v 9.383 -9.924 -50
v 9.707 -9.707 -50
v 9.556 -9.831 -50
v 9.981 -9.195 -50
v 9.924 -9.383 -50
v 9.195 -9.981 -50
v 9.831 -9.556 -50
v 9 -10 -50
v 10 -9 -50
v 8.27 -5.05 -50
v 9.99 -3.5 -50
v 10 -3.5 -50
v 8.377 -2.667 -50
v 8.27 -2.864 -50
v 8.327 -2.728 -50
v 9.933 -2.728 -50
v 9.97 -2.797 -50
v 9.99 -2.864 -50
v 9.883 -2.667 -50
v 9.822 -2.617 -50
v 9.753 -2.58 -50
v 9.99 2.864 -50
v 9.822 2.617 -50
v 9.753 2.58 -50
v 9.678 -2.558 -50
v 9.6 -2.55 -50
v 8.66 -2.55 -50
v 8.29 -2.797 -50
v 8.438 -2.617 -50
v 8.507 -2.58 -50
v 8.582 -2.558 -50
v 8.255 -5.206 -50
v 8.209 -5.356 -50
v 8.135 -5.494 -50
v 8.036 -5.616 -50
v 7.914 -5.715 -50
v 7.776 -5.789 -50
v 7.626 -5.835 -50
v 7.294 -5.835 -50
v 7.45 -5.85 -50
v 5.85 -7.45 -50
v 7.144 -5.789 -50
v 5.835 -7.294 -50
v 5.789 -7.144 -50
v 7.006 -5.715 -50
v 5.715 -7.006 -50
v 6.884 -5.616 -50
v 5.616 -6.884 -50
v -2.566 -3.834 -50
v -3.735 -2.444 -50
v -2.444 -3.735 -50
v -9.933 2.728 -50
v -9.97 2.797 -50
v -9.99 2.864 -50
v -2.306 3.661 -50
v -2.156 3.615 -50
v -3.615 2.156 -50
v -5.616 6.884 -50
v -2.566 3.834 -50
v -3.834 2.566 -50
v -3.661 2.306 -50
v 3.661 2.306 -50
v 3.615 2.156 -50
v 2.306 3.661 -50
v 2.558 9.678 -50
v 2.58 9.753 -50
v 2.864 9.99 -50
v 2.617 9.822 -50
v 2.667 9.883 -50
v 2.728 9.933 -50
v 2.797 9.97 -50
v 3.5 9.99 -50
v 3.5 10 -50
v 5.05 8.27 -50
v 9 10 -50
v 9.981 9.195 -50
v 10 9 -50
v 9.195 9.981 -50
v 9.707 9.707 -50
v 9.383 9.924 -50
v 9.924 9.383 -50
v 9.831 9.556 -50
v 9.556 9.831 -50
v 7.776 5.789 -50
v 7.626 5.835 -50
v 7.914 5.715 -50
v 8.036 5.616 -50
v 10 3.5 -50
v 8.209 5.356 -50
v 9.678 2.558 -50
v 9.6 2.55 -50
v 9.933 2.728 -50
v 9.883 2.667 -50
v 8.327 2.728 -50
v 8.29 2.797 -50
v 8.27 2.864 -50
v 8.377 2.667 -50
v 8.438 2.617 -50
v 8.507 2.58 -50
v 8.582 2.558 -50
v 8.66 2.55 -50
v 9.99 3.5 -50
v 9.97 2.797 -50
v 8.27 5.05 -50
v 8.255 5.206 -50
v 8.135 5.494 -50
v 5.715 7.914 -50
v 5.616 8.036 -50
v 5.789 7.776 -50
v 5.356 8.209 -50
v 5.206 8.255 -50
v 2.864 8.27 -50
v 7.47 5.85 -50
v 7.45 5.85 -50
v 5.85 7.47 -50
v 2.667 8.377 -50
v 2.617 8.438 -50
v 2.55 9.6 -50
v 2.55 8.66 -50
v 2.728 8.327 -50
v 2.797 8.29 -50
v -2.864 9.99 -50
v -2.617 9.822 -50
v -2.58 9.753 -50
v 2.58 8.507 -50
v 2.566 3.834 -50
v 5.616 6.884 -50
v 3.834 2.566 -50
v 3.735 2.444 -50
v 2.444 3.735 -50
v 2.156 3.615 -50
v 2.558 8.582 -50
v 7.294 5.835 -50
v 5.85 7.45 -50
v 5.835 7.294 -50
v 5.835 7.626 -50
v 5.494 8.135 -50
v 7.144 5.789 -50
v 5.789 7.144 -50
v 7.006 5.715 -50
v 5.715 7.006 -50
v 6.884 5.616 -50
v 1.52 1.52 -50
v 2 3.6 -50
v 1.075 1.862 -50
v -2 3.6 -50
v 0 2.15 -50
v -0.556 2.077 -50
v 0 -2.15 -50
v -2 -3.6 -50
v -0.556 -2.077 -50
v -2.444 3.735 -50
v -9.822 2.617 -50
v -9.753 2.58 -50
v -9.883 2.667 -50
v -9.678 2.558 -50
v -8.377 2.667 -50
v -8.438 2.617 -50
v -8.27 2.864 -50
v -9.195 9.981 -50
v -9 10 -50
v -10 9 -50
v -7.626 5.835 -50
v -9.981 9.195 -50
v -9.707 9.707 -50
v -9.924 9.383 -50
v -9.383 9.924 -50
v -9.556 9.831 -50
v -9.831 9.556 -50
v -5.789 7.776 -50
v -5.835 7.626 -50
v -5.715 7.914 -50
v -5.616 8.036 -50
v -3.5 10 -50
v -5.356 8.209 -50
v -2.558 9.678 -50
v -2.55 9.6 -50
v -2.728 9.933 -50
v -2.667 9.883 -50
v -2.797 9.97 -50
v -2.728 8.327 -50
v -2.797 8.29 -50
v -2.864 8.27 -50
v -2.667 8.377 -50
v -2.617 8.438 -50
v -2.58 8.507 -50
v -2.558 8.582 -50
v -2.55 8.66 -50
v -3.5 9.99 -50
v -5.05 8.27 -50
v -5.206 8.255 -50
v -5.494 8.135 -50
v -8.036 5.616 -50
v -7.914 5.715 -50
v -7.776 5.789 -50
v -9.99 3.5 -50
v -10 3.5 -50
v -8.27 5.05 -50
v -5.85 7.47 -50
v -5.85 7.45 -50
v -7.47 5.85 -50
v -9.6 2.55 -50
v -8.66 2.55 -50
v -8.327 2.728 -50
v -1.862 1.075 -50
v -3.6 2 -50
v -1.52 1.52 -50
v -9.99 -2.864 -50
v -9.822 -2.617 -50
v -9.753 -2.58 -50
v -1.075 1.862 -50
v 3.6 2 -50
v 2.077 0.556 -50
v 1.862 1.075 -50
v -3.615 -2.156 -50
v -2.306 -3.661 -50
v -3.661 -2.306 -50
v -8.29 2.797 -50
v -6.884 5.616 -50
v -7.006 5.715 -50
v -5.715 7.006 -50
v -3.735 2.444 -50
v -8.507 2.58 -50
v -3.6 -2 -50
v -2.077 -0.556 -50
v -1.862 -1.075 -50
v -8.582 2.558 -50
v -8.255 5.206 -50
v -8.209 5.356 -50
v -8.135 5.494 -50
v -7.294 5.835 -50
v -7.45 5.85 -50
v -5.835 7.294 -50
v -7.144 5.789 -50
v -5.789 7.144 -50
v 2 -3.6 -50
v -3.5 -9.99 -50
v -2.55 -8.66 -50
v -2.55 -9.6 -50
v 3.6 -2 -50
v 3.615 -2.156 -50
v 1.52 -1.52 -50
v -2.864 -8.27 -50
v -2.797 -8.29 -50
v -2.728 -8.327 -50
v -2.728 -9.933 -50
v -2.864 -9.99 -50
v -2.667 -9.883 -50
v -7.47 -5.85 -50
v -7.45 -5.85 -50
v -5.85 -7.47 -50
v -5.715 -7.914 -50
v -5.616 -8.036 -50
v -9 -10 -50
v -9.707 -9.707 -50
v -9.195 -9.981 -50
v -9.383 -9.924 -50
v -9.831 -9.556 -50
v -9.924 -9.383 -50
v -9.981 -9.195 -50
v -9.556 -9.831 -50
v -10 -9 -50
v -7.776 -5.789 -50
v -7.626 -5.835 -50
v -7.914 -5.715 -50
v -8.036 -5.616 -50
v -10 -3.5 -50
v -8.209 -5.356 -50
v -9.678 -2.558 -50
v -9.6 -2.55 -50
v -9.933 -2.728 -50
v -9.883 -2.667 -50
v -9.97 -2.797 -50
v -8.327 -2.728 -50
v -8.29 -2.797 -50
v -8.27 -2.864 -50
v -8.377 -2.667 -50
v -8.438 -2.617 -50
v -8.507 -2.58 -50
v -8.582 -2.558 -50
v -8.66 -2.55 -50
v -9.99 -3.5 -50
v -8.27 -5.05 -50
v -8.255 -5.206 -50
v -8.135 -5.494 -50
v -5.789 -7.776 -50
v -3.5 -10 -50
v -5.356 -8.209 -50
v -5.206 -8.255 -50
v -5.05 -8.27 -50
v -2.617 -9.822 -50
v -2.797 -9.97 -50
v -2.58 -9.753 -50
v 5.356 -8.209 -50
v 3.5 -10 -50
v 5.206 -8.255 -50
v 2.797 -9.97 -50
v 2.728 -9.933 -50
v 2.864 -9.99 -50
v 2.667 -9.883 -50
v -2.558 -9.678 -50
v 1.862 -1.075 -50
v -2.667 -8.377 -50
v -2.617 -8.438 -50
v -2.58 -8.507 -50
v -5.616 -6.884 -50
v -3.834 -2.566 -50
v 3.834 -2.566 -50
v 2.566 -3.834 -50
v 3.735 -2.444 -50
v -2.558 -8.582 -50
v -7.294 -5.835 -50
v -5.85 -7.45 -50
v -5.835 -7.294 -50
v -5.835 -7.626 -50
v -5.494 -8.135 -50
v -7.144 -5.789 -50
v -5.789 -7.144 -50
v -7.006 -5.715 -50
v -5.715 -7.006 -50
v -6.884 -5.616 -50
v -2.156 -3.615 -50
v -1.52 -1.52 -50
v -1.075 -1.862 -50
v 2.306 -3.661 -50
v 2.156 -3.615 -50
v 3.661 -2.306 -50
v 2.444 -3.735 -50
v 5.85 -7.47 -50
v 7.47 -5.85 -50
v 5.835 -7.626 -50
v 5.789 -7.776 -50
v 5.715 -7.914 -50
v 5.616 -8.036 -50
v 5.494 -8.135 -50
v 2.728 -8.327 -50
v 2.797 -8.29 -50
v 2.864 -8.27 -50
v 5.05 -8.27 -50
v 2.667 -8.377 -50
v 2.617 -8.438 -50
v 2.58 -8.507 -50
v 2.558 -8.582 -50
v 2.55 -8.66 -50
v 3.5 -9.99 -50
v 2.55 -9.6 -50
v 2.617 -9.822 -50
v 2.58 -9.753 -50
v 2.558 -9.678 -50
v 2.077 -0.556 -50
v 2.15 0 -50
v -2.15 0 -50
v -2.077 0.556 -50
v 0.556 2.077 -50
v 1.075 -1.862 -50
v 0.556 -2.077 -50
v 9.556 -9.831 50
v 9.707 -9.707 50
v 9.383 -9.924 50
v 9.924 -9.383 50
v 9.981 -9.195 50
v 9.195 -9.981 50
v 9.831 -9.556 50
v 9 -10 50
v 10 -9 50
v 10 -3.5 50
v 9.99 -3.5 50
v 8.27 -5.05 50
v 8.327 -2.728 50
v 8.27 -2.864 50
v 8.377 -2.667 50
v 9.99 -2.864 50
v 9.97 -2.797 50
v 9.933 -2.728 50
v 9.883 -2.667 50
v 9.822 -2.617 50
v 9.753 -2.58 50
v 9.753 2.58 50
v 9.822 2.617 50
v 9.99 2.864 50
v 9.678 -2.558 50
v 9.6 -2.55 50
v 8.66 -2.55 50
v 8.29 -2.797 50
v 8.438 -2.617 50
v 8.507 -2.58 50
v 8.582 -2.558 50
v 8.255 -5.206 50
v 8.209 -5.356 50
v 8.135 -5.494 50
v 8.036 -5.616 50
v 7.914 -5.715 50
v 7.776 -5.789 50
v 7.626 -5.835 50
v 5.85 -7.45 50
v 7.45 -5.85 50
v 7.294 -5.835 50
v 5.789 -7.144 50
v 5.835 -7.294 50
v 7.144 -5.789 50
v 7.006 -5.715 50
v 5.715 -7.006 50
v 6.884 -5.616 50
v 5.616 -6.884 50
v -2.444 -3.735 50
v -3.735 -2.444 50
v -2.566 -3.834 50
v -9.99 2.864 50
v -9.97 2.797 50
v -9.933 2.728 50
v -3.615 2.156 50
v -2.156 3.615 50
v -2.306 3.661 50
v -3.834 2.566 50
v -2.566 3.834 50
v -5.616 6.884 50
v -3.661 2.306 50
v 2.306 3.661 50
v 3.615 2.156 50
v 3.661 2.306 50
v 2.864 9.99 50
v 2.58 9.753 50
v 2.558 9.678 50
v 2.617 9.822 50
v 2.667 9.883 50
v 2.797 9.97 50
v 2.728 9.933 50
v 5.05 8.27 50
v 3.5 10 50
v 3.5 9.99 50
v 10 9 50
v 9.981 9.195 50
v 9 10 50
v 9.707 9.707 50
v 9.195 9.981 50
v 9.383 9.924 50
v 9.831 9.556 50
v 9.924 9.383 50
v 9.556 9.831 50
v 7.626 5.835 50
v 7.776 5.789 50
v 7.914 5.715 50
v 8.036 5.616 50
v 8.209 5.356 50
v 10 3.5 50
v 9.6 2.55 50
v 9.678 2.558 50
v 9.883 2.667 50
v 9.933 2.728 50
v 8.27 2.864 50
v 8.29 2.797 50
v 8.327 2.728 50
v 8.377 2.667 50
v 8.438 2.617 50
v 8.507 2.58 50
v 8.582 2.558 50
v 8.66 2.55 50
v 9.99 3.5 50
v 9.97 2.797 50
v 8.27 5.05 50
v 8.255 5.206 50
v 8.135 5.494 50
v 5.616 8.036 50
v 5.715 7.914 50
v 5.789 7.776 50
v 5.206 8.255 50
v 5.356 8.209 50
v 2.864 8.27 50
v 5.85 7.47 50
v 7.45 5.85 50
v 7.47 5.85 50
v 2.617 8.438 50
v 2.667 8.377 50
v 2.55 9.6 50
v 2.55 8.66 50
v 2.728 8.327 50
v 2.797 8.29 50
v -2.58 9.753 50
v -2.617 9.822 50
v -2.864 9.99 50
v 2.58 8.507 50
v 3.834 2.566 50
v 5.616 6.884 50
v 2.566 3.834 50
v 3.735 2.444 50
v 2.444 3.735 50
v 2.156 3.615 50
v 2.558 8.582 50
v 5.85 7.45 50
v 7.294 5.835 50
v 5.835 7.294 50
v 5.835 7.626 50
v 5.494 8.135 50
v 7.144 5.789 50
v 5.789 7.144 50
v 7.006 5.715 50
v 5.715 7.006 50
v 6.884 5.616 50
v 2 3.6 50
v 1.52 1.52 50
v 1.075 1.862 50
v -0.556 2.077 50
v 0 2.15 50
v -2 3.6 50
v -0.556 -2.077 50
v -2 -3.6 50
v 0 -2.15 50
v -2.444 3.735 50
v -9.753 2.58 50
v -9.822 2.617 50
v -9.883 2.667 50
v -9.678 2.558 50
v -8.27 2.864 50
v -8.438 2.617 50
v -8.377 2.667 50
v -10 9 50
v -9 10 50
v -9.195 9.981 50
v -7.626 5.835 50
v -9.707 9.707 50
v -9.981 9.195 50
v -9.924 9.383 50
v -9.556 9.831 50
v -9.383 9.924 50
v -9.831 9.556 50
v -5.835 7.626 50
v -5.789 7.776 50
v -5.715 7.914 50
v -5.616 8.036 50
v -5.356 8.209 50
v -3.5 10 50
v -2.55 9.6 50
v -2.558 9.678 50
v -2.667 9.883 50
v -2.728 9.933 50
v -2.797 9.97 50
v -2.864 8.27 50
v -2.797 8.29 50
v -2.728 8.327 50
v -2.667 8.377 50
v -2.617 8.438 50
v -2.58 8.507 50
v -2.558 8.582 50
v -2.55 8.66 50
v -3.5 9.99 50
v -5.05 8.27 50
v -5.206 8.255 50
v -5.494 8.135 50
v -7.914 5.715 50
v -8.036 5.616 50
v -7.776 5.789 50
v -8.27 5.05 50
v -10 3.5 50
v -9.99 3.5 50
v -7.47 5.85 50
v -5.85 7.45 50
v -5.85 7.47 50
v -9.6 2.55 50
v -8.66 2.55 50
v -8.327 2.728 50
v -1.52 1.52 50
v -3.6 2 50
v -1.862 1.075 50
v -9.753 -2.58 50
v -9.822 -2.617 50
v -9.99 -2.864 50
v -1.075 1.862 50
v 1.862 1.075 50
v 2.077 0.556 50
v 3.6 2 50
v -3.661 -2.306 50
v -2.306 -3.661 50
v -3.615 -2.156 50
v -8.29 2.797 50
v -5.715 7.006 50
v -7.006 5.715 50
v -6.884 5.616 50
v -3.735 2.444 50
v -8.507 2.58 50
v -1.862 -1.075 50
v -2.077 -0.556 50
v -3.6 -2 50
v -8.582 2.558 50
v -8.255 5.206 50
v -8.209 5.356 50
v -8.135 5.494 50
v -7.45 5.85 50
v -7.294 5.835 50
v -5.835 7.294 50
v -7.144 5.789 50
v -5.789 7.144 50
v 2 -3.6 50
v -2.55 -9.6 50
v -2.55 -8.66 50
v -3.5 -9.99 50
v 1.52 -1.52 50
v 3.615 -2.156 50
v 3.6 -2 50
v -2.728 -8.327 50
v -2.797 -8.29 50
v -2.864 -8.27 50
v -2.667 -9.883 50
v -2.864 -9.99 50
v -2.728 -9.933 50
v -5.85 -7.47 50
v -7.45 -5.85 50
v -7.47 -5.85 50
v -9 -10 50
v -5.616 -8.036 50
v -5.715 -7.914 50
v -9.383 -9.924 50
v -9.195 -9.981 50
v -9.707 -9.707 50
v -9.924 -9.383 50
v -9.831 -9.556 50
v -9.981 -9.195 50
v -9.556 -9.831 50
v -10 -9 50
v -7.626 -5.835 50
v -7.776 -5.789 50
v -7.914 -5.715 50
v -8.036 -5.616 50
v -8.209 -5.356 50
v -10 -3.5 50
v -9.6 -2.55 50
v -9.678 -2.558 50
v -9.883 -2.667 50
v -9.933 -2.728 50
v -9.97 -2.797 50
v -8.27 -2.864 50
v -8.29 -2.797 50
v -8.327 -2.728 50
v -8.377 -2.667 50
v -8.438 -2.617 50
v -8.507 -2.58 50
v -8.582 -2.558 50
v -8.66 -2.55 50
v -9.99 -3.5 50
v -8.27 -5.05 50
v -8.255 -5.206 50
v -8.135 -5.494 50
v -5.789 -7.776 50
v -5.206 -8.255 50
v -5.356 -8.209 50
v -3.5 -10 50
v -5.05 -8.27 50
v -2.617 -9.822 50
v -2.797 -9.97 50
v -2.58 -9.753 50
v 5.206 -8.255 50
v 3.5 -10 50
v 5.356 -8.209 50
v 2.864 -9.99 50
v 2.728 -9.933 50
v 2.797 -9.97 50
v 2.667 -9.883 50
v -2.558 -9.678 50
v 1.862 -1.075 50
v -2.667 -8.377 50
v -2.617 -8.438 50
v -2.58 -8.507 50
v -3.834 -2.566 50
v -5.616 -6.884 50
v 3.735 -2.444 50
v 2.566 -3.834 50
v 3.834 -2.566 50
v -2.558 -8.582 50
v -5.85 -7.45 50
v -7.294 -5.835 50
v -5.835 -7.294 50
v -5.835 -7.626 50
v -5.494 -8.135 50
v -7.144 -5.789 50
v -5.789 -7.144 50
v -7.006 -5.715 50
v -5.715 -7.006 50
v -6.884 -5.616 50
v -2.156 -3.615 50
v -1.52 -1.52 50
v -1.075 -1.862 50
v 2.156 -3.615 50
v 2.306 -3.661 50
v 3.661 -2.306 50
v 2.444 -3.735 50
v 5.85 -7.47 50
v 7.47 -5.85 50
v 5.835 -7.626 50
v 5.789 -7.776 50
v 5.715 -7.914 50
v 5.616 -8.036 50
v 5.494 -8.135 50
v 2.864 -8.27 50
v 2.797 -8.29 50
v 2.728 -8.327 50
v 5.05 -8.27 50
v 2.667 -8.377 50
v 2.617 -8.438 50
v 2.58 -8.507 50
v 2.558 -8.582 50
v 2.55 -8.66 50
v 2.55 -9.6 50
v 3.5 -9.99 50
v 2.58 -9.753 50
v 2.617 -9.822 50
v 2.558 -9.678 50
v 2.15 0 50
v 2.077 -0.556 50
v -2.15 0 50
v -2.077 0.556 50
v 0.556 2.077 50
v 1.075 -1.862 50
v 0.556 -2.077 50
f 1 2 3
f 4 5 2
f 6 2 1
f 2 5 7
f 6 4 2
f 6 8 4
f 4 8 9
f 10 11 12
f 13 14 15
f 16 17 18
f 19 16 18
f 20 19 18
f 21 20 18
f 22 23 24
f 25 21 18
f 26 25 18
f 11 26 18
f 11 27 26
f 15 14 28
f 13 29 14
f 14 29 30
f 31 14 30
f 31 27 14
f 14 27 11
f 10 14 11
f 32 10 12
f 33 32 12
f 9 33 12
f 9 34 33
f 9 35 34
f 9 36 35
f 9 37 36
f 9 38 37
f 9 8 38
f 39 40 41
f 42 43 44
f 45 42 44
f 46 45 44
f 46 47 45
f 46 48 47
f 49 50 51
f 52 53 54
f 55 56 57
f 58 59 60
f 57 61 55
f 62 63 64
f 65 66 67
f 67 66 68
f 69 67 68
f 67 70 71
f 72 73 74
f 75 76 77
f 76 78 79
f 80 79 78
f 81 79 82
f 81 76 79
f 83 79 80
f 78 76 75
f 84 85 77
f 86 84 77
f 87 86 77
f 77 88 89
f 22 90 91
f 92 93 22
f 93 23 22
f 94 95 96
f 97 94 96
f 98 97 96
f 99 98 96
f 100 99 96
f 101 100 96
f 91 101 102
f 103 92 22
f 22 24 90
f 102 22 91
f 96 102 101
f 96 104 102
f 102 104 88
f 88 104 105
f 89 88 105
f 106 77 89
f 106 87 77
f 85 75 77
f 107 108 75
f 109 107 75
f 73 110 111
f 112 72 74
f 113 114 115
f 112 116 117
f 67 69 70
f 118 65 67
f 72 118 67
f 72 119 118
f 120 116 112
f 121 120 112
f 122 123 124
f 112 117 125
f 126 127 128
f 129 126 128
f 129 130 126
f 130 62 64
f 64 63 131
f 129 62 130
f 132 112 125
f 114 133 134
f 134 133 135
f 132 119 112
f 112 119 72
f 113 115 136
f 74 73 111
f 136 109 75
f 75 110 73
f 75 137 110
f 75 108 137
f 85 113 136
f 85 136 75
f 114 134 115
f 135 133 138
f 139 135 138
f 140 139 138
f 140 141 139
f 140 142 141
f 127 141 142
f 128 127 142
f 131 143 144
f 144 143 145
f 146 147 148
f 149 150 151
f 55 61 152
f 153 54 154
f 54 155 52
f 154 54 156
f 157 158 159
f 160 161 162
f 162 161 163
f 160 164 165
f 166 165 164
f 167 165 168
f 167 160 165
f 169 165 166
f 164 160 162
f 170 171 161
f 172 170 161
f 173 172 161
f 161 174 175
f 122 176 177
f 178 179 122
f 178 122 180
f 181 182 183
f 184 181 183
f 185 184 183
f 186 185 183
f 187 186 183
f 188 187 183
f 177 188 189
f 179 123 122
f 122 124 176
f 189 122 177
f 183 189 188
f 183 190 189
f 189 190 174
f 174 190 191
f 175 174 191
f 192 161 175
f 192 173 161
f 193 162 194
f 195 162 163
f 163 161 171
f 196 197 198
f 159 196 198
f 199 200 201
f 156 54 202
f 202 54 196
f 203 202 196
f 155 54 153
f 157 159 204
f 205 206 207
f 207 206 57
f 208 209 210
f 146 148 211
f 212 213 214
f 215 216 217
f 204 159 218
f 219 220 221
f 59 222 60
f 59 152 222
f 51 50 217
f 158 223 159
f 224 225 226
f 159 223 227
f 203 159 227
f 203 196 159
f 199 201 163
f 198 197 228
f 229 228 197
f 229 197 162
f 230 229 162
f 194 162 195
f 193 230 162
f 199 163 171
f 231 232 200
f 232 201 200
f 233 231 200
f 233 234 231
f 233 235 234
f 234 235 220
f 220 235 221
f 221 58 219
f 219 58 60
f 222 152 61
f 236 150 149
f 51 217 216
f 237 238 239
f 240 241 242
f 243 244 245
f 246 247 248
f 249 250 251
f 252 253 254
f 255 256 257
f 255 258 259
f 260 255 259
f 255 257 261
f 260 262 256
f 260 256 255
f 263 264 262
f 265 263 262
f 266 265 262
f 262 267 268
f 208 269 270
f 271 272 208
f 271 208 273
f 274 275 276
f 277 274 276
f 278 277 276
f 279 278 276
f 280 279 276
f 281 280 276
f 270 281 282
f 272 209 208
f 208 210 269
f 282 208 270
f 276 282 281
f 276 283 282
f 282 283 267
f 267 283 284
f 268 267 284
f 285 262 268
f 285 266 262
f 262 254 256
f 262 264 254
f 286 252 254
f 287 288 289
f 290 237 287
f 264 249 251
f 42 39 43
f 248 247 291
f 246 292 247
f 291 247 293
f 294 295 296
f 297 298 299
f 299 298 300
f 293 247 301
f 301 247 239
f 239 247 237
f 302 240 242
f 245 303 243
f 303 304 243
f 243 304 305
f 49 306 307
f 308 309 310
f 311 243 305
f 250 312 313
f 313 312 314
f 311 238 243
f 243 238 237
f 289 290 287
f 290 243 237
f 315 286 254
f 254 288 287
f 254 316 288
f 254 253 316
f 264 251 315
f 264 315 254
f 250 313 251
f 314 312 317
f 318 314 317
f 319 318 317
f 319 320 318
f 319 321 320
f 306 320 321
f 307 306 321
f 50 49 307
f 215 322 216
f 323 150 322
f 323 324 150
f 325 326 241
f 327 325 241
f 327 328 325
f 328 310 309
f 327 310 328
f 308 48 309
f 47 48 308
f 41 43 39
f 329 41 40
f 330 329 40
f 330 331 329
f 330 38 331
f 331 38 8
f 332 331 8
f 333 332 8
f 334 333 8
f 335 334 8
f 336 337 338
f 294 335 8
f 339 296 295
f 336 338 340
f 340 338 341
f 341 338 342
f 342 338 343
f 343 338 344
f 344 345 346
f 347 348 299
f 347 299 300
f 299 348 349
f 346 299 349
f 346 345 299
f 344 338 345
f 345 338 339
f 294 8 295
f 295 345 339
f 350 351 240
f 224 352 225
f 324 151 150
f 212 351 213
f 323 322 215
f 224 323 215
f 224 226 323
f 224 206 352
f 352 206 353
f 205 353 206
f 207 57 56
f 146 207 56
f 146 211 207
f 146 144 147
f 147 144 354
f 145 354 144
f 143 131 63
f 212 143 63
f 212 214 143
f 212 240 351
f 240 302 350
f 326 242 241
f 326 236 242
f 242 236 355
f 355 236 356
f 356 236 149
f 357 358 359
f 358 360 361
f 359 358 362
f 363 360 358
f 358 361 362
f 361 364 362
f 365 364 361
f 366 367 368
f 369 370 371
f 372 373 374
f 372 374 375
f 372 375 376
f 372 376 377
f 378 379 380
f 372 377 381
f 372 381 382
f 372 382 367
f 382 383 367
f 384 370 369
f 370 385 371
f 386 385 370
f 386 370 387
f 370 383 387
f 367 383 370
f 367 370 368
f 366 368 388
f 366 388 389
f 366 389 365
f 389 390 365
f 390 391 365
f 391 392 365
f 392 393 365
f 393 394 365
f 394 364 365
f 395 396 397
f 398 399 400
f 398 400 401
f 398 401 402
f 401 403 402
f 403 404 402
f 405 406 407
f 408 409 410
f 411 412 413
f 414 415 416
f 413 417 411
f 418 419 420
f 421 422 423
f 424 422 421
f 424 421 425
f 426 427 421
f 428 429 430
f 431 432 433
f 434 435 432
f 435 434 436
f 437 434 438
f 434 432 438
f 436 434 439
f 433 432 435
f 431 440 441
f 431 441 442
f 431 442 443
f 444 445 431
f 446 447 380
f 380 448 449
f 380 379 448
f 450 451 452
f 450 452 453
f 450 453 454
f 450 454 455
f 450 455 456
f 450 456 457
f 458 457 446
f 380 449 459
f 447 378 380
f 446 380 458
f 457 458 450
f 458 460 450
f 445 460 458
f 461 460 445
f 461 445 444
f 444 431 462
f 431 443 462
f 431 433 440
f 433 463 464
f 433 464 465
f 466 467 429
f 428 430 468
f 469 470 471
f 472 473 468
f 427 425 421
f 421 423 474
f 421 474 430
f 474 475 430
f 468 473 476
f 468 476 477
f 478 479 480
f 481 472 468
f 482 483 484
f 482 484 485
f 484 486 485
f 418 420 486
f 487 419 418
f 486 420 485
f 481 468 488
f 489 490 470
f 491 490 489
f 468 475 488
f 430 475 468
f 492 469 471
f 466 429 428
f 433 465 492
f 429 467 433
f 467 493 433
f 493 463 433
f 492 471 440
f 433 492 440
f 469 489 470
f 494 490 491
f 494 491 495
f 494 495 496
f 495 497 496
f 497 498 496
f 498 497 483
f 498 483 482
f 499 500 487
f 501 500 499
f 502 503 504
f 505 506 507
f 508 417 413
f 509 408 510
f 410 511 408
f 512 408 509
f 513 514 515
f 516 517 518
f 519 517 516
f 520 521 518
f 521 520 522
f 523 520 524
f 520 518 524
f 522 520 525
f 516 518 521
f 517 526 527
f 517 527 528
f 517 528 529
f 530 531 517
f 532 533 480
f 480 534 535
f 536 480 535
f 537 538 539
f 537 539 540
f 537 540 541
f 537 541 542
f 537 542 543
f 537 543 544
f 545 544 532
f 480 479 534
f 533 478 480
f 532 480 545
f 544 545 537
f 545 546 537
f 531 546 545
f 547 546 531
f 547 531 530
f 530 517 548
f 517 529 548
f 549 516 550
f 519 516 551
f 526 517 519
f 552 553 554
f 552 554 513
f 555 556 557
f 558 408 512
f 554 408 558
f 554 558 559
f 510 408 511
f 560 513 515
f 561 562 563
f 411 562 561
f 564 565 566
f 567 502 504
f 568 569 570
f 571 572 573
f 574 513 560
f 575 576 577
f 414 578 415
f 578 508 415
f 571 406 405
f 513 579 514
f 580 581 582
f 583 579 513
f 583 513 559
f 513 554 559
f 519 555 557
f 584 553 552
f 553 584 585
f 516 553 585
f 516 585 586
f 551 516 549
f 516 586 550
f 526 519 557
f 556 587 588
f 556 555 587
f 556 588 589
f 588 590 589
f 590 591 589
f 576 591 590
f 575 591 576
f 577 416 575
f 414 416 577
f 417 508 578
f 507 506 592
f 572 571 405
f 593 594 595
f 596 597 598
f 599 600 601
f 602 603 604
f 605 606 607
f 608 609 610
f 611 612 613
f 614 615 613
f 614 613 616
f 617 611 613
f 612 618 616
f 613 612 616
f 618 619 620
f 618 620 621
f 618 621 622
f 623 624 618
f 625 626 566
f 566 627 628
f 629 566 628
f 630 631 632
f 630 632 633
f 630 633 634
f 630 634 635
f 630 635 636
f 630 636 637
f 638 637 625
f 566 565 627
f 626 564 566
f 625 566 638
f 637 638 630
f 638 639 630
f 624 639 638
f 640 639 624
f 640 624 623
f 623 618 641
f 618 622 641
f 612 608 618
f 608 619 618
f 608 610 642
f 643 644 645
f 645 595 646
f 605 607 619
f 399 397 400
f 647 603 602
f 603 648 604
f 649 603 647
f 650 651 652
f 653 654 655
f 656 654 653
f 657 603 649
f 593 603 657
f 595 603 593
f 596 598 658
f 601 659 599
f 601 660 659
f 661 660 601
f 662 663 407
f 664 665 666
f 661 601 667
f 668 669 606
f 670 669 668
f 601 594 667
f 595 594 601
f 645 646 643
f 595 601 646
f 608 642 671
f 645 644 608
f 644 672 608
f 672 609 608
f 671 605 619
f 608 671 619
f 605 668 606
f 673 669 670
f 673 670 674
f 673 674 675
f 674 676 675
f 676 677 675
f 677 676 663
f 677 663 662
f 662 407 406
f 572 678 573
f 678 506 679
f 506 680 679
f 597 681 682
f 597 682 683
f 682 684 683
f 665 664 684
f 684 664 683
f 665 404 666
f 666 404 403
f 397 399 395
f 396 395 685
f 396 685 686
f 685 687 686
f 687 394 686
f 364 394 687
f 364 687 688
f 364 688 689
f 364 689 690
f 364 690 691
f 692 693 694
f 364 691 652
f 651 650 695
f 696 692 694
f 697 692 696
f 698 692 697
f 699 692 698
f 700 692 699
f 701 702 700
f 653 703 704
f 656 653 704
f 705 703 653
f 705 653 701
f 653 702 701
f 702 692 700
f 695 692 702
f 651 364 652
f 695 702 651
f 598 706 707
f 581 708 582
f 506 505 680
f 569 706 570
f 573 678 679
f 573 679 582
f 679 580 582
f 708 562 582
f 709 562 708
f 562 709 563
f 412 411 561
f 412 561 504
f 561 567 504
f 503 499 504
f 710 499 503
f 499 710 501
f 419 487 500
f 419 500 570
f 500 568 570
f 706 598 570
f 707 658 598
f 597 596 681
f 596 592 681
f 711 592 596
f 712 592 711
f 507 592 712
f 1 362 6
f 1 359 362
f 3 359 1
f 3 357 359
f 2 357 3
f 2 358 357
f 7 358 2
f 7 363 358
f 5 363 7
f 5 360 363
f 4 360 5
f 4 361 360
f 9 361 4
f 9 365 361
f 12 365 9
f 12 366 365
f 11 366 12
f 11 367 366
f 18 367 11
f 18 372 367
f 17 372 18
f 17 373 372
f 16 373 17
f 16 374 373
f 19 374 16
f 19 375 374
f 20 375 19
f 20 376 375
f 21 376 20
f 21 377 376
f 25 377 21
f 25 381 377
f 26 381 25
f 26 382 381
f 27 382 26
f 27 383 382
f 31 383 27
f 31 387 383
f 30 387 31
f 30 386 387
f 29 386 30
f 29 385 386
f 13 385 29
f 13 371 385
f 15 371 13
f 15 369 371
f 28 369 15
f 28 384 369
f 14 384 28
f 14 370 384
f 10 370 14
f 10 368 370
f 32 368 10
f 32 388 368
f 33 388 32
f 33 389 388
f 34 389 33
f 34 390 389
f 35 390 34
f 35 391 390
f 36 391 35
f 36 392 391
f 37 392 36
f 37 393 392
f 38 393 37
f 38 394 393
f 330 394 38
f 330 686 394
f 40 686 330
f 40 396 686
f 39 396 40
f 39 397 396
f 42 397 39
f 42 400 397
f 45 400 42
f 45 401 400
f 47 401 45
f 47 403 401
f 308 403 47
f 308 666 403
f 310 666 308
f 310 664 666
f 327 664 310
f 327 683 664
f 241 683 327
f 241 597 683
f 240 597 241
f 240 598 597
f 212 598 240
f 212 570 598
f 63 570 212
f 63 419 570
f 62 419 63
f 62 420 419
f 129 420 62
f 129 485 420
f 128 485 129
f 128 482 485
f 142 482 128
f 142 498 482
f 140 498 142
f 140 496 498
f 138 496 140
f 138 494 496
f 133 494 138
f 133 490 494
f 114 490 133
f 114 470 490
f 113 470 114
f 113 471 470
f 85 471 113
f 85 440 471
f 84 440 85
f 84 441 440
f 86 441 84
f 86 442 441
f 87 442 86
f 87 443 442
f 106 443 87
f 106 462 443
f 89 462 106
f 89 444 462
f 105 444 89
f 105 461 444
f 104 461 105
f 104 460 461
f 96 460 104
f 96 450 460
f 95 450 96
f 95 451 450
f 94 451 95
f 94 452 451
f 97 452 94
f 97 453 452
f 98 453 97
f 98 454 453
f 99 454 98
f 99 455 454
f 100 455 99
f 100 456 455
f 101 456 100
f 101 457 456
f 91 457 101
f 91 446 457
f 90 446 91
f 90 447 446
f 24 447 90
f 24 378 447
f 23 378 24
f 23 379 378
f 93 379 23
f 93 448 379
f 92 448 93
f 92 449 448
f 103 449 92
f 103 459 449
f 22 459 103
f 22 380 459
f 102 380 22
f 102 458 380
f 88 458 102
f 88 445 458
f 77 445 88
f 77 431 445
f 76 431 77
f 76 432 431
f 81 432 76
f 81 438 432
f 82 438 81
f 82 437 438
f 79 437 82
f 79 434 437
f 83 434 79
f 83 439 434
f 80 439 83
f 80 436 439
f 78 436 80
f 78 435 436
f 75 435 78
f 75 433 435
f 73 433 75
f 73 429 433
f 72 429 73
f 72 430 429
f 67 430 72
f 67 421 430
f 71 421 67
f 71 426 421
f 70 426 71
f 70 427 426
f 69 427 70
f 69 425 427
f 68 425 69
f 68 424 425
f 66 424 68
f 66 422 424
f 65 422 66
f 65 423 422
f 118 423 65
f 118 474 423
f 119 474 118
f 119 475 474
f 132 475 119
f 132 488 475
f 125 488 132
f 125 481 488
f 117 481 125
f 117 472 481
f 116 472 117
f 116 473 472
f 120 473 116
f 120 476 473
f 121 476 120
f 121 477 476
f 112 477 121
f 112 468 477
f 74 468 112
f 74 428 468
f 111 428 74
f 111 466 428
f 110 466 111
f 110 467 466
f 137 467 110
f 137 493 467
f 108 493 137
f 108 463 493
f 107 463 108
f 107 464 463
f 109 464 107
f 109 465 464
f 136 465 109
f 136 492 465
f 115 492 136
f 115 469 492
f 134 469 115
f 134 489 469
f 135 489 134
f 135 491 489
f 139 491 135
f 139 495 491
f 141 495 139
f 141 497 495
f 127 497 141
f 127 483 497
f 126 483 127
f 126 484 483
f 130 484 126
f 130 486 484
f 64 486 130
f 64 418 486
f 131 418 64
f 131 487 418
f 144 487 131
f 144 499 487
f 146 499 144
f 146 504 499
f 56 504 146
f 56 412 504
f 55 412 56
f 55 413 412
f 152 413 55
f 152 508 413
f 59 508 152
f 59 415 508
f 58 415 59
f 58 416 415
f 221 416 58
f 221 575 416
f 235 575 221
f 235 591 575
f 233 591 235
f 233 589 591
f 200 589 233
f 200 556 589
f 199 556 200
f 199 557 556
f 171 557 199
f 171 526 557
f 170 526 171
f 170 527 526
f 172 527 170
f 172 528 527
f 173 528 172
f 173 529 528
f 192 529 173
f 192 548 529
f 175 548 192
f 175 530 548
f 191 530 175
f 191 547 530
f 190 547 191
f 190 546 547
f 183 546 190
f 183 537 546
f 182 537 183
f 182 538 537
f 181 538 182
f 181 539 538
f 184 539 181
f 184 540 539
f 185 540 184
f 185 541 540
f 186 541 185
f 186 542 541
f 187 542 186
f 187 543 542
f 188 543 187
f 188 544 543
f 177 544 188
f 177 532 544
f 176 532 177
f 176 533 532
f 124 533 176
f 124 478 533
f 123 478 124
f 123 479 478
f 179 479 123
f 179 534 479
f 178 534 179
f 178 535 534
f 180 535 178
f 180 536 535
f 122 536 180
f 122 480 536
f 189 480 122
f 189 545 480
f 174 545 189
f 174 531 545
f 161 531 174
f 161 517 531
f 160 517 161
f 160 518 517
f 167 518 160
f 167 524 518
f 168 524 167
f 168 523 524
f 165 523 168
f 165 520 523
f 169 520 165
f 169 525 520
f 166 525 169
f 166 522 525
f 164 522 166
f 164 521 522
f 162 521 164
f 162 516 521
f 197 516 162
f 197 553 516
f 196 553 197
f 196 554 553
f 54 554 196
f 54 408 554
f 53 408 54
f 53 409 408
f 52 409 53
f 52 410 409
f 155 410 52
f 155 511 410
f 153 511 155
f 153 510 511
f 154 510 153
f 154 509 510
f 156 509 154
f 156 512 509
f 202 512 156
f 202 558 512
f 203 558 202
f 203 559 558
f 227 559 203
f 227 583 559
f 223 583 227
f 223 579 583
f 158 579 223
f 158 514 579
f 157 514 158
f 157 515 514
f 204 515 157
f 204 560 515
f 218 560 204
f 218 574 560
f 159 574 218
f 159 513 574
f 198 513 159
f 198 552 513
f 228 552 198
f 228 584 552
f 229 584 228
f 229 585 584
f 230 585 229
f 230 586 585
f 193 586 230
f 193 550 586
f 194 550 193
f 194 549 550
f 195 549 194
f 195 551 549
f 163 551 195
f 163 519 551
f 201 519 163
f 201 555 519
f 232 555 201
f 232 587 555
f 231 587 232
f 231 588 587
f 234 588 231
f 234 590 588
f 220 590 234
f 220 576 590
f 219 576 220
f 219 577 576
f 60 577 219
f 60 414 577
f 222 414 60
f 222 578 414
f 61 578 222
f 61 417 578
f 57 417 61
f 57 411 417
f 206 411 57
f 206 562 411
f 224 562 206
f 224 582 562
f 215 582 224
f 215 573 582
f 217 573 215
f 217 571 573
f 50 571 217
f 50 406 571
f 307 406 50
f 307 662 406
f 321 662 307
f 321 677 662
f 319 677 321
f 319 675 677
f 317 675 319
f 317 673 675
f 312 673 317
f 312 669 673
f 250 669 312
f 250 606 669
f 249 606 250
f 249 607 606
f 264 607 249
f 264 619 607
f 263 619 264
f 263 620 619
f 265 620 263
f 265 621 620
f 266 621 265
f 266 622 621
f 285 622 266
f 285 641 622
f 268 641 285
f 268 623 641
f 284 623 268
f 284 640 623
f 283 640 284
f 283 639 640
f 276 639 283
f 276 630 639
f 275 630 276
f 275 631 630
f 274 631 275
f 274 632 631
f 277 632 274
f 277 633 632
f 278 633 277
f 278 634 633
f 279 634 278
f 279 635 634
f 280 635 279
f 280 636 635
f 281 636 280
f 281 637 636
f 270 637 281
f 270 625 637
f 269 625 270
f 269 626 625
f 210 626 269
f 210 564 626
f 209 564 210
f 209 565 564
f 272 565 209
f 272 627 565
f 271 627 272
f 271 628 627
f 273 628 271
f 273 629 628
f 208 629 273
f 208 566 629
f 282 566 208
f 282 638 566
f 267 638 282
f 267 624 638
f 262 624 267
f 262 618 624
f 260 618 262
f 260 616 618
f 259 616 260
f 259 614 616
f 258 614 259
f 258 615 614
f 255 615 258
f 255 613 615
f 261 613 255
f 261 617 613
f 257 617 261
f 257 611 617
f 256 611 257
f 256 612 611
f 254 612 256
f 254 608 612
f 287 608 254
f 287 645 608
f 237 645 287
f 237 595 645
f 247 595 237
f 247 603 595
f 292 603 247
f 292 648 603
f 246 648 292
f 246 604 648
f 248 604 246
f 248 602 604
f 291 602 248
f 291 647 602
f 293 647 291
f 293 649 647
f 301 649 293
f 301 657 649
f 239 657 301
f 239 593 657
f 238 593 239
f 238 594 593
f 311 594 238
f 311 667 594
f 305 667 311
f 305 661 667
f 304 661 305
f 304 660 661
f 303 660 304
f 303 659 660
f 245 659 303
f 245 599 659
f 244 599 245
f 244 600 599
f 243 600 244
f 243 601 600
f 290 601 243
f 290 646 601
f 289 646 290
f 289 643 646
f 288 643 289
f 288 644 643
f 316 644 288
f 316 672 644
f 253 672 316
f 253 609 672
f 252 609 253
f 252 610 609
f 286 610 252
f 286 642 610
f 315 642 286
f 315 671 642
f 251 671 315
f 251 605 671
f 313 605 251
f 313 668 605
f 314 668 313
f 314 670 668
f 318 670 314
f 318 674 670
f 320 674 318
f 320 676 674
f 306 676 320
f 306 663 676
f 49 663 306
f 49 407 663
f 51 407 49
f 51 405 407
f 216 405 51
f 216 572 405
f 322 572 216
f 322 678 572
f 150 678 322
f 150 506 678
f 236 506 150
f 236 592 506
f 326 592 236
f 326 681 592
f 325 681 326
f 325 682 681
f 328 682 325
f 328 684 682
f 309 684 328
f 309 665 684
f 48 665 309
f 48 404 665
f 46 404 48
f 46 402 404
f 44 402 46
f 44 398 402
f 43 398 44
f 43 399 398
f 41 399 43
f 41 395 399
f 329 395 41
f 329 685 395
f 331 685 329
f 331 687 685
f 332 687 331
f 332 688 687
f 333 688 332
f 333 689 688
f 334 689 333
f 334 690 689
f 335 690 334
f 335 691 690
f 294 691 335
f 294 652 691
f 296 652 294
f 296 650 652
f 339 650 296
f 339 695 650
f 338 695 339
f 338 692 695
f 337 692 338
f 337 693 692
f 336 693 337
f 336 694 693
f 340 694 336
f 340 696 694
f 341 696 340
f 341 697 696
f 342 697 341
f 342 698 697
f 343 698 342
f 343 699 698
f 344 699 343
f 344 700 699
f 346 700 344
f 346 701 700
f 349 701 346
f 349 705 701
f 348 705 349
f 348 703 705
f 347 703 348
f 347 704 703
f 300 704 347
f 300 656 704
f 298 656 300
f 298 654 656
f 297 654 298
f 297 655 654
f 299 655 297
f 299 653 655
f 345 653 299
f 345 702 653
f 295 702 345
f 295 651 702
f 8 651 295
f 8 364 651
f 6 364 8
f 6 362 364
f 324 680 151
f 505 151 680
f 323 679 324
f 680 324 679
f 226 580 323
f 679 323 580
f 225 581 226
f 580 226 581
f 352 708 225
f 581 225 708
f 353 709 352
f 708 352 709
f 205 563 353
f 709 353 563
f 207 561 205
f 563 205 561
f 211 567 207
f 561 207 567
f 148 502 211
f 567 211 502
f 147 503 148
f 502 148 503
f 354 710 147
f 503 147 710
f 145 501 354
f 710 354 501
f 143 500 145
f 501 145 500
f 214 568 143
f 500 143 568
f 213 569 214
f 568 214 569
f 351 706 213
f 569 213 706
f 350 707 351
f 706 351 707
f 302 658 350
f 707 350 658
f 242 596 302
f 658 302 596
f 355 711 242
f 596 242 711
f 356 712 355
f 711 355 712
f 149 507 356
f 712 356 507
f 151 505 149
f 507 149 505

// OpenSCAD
/** 
 * @file
 * Generic library for fractional T-Slot extrusions.
 *
 * Creative Commons Share Alike 3.0
 * Copyright (c) 2014 Manuel García
 *
 * Original library (David Lee Miller)
 * https://www.thingiverse.com/thing:136430
 */ 

ProfileCore = 4.3;     // Profile core Ø (Default M5).
minkR_TS = 0.04 * 20;  // Minkowski radius for the T-Slot.
minkR_IC = 0.075 * 20; // Minkowski radius for the inner cutout.
minkR_PF = 0.05 * 20;  // Minkowski radius for the profile corners.

2020Profile(100);
//2040Profile(100);
//2060Profile(100);
//2080Profile(100);
//4040Profile(100);
//4060Profile(100);
//4080Profile(100);

module fillet(rad) {
  translate([-rad, -rad, 0])
  difference() {
    translate([0, 0, 0]) square([rad + 0.01, rad + 0.01]);
    circle(r = rad, center = true, $fn = 32);
  }
}

module insideCutout() {
  minkowski() {
    translate([0, 0, 0]) circle(r = minkR_IC, center = true, $fn = 32);
    hull() {
      square([0.2 * 20 - minkR_IC, 0.645 * 20 - 2 * minkR_IC], center = true);
      square([0.8 * 20 - 2 * minkR_IC, 0.001 * 20], center = true);
    }
  }
}

module doubleCutout() {
  union() {
    minkowski() {
      translate([0, 0, 0]) circle(r = minkR_IC, center = true, $fn = 32);
      union() {
        rotate([0, 0, 0]) hull() {
          translate([-0.5 * 20, 0, 0]) hull() {
            square([0.2 * 20 - minkR_IC, 0.645 * 20 - 2 * minkR_IC], center = true);
            square([0.8 * 20 - 2 * minkR_IC, 0.001 * 20], center = true);
          }
          translate([0.5 * 20, 0, 0]) hull() {
            square([0.2 * 20 - minkR_IC, 0.645 * 20 - 2 * minkR_IC], center = true);
            square([0.8 * 20 - 2 * minkR_IC, 0.001 * 20], center = true);
          }
        }
        rotate([0, 0, 90]) hull() {
          translate([-0.5 * 20, 0, 0]) hull() {
            square([0.2 * 20 - minkR_IC, 0.645 * 20 - 2 * minkR_IC], center = true);
            square([0.8 * 20 - 2 * minkR_IC, 0.001 * 20], center = true);
          }
          translate([0.5 * 20, 0, 0]) hull() {
            square([0.2 * 20 - minkR_IC, 0.645 * 20 - 2 * minkR_IC], center = true);
            square([0.8 * 20 - 2 * minkR_IC, 0.001 * 20], center = true);
          }
        }
      }
    }
    rotate([0, 0, 0]) translate([-0.645 * 20 / 2, -0.645 * 20 / 2, 0]) fillet(minkR_IC);
    rotate([0, 0, 180]) translate([-0.645 * 20 / 2, -0.645 * 20 / 2, 0]) fillet(minkR_IC);
    rotate([0, 0, 90]) translate([-0.645 * 20 / 2, -0.645 * 20 / 2, 0]) fillet(minkR_IC);
    rotate([0, 0, -90]) translate([-0.645 * 20 / 2, -0.645 * 20 / 2, 0]) fillet(minkR_IC);
  }
}

module tSlot() {
  union() {
    translate([minkR_TS, 0, 0])
    minkowski() {
      translate([0, 0, 0]) circle(r = minkR_TS, center = true, $fn = 32);
      hull() {
        square([0.001 * 20, 0.585 * 20 - 2 * minkR_TS], center = true);
        translate([(0.233 * 20 - 2 * minkR_TS) / 2, 0, 0]) square([0.233 * 20 - 2 * minkR_TS, 0.2 * 20], center = true);
      }
    }
    translate([-0.255 * 20 / 2 + 0.01, 0, 0]) square(0.255 * 20, center = true);
    translate([-0.35 * 20 / 2 - 0.087 * 20 + 0.01, 0, 0]) square(0.35 * 20, center = true);
    translate([0, -0.255 * 20 / 2, 0]) fillet(minkR_TS / 2);
    translate([-0.087 * 20, -0.255 * 20 / 2, 0]) rotate([0, 0, 90]) fillet(minkR_TS / 2);
    scale([1, -1, 1]) translate([0, -0.255 * 20 / 2, 0]) fillet(minkR_TS / 2);
    scale([1, -1, 1]) translate([-0.087 * 20, -0.255 * 20 / 2, 0]) rotate([0, 0, 90]) fillet(minkR_TS / 2);
  }
}

module 2020Profile(height, core = ProfileCore) {
  linear_extrude(height = height, center = true)
  union() {
    difference() {
      minkowski() {
        translate([0, 0, 0]) circle(r = minkR_PF, center = true, $fn = 32);
        square([1 * 20 - 2 * minkR_PF, 1 * 20 - 2 * minkR_PF], center = true);
      }
      translate([0, 0, 0]) circle(r = core / 2, $fn = 24);
      translate([-0.5 * 20 + 0.087 * 20, 0, 0]) tSlot();
      rotate([0, 0, 180]) translate([-0.5 * 20 + 0.087 * 20, 0, 0]) tSlot();
      translate([0, -0.5 * 20 + 0.087 * 20, 0]) rotate([0, 0, 90]) tSlot();
      translate([0, 0.5 * 20 - 0.087 * 20, 0]) rotate([0, 0, -90]) tSlot();
    }
  }
}

module 2040Profile(height, core = ProfileCore) {
  linear_extrude(height = height, center = true)
  difference() {
    minkowski() {
      translate([0, 0, 0]) circle(r = minkR_PF, center = true, $fn = 32);
      square([1 * 20 - 2 * minkR_PF, 2 * 20 - 2 * minkR_PF], center = true);
    }
    translate([0, 0.5 * 20, 0]) circle(r = core / 2, $fn = 24);
    translate([0, -0.5 * 20, 0]) circle(r = core / 2, $fn = 24);
    translate([0, 0, 0]) insideCutout();
    translate([-0.5 * 20 + 0.087 * 20, 0.5 * 20, 0]) tSlot();
    rotate([0, 0, 180]) translate([-0.5 * 20 + 0.087 * 20, 0.5 * 20, 0]) tSlot();
    translate([-0.5 * 20 + 0.087 * 20, -0.5 * 20, 0]) tSlot();
    rotate([0, 0, 180]) translate([-0.5 * 20 + 0.087 * 20, -0.5 * 20, 0]) tSlot();
    translate([0, -1 * 20 + 0.087 * 20, 0]) rotate([0, 0, 90]) tSlot();
    translate([0, 1 * 20 - 0.087 * 20, 0]) rotate([0, 0, -90]) tSlot();
  }
}

module 2060Profile(height, core = ProfileCore) {
  linear_extrude(height = height, center = true)
  difference() {
    minkowski() {
      translate([0, 0, 0]) circle(r = minkR_PF, center = true, $fn = 32);
      square([1 * 20 - 2 * minkR_PF, 3 * 20 - 2 * minkR_PF], center = true);
    }
    translate([0, 0, 0]) circle(r = core / 2, $fn = 24);
    translate([0, 1 * 20, 0]) circle(r = core / 2, $fn = 24);
    translate([0, -1 * 20, 0]) circle(r = core / 2, $fn = 24);
    translate([0, -0.5 * 20, 0]) insideCutout();
    translate([0, 0.5 * 20, 0]) insideCutout();
    translate([-0.5 * 20 + 0.087 * 20, 0, 0]) tSlot();
    rotate([0, 0, 180]) translate([-0.5 * 20 + 0.087 * 20, 0, 0]) tSlot();
    translate([-0.5 * 20 + 0.087 * 20, 1 * 20, 0]) tSlot();
    rotate([0, 0, 180]) translate([-0.5 * 20 + 0.087 * 20, 1 * 20, 0]) tSlot();
    translate([-0.5 * 20 + 0.087 * 20, -1 * 20, 0]) tSlot();
    rotate([0, 0, 180]) translate([-0.5 * 20 + 0.087 * 20, -1 * 20, 0]) tSlot();
    translate([0, -1.5 * 20 + 0.087 * 20, 0]) rotate([0, 0, 90]) tSlot();
    translate([0, 1.5 * 20 - 0.087 * 20, 0]) rotate([0, 0, -90]) tSlot();
  }
}

module 2080Profile(height, core = ProfileCore) {
  linear_extrude(height = height, center = true)
  difference() {
    minkowski() {
      translate([0, 0, 0]) circle(r = minkR_PF, center = true, $fn = 32);
      square([1 * 20 - 2 * minkR_PF, 4 * 20 - 2 * minkR_PF], center = true);
    }
    translate([0, 0.5 * 20 + 20, 0]) circle(r = core / 2, $fn = 24);
    translate([0, 0.5 * 20 + 20 - 1 * 20, 0]) circle(r = core / 2, $fn = 24);
    translate([0, 0.5 * 20 + 20 - 2 * 20, 0]) circle(r = core / 2, $fn = 24);
    translate([0, 0.5 * 20 + 20 - 3 * 20, 0]) circle(r = core / 2, $fn = 24);
    translate([0, 0.5 * 20 + 20 - 0.5 * 20, 0]) insideCutout();
    translate([0, 0, 0]) insideCutout();
    translate([0, -(0.5 * 20 + 20) + 0.5 * 20, 0]) insideCutout();
    rotate([0, 0, 180]) translate([-0.5 * 20 + 0.087 * 20, -(0.5 * 20 + 20), 0]) tSlot();
    rotate([0, 0, 180]) translate([-0.5 * 20 + 0.087 * 20, -(0.5 * 20), 0]) tSlot();
    rotate([0, 0, 180]) translate([-0.5 * 20 + 0.087 * 20, 0.5 * 20, 0]) tSlot();
    rotate([0, 0, 180]) translate([-0.5 * 20 + 0.087 * 20, 0.5 * 20 + 20, 0]) tSlot();
    translate([-0.5 * 20 + 0.087 * 20, 0.5 * 20 + 20, 0]) tSlot();
    translate([-0.5 * 20 + 0.087 * 20, 0.5 * 20, 0]) tSlot();
    translate([-0.5 * 20 + 0.087 * 20, -(0.5 * 20), 0]) tSlot();
    translate([-0.5 * 20 + 0.087 * 20, -(0.5 * 20 + 20), 0]) tSlot();
    translate([0, -2 * 20 + 0.087 * 20, 0]) rotate([0, 0, 90]) tSlot();
    translate([0, 2 * 20 - 0.087 * 20, 0]) rotate([0, 0, -90]) tSlot();
  }
}

module 4040Profile(height, core = ProfileCore) {
  linear_extrude(height = height, center = true)
  difference() {
    minkowski() {
      translate([0, 0, 0]) circle(r = minkR_PF, center = true, $fn = 32);
      square([2 * 20 - 2 * minkR_PF, 2 * 20 - 2 * minkR_PF], center = true);
    }
    translate([0.5 * 20, 0.5 * 20, 0]) circle(r = core / 2, $fn = 24);
    translate([-0.5 * 20, 0.5 * 20, 0]) circle(r = core / 2, $fn = 24);
    translate([0.5 * 20, -0.5 * 20, 0]) circle(r = core / 2, $fn = 24);
    translate([-0.5 * 20, -0.5 * 20, 0]) circle(r = core / 2, $fn = 24);
    translate([0, 0, 0]) doubleCutout();
    translate([-1 * 20 + 0.087 * 20, 0.5 * 20, 0]) tSlot();
    rotate([0, 0, 180]) translate([-1 * 20 + 0.087 * 20, 0.5 * 20, 0]) tSlot();
    translate([-1 * 20 + 0.087 * 20, -0.5 * 20, 0]) tSlot();
    rotate([0, 0, 180]) translate([-1 * 20 + 0.087 * 20, -0.5 * 20, 0]) tSlot();
    translate([-0.5 * 20, 1 * 20 - 0.087 * 20, 0]) rotate([0, 0, -90]) tSlot();
    rotate([0, 0, 180]) translate([-0.5 * 20, 1 * 20 - 0.087 * 20, 0]) rotate([0, 0, -90]) tSlot();
    translate([0.5 * 20, 1 * 20 - 0.087 * 20, 0]) rotate([0, 0, -90]) tSlot();
    rotate([0, 0, 180]) translate([0.5 * 20, 1 * 20 - 0.087 * 20, 0]) rotate([0, 0, -90]) tSlot();
  }
}

module 4060Profile(height, core = ProfileCore) {
  linear_extrude(height = height, center = true)
  difference() {
    minkowski() {
      translate([0, 0, 0]) circle(r = minkR_PF, center = true, $fn = 32);
      square([2 * 20 - 2 * minkR_PF, 2 * 30 - 2 * minkR_PF], center = true);
    }
    translate([0.5 * 20, 1 * 20, 0]) circle(r = core / 2, $fn = 24);
    translate([-0.5 * 20, 1 * 20, 0]) circle(r = core / 2, $fn = 24);
    translate([0.5 * 20, 0, 0]) circle(r = core / 2, $fn = 24);
    translate([-0.5 * 20, 0, 0]) circle(r = core / 2, $fn = 24);
    translate([0.5 * 20, -1 * 20, 0]) circle(r = core / 2, $fn = 24);
    translate([-0.5 * 20, -1 * 20, 0]) circle(r = core / 2, $fn = 24);
    translate([-1 * 20 / 2, 1 * 20 / 2, 0]) insideCutout();
    translate([0, 2 * 20 / 2, 0]) rotate([0, 0, -90]) insideCutout();
    translate([1 * 20 / 2, 1 * 20 / 2, 0]) insideCutout();
    translate([0, -20 / 2, 0]) doubleCutout();
    translate([-1 * 20 + 0.087 * 20, 1 * 20, 0]) tSlot();
    translate([-1 * 20 + 0.087 * 20, 0, 0]) tSlot();
    translate([-1 * 20 + 0.087 * 20, -1 * 20, 0]) tSlot();
    rotate([0, 0, 180]) translate([-1 * 20 + 0.087 * 20, 1 * 20, 0]) tSlot();
    rotate([0, 0, 180]) translate([-1 * 20 + 0.087 * 20, 0, 0]) tSlot();
    rotate([0, 0, 180]) translate([-1 * 20 + 0.087 * 20, -1 * 20, 0]) tSlot();
    translate([-1 * 20 / 2, -1.5 * 20 + 0.087 * 20, 0]) rotate([0, 0, 90]) tSlot();
    translate([1 * 20 / 2, -1.5 * 20 + 0.087 * 20, 0]) rotate([0, 0, 90]) tSlot();
    translate([-1 * 20 / 2, 1.5 * 20 - 0.087 * 20, 0]) rotate([0, 0, -90]) tSlot();
    translate([1 * 20 / 2, 1.5 * 20 - 0.087 * 20, 0]) rotate([0, 0, -90]) tSlot();
  }
}

module 4080Profile(height, core = ProfileCore) {
  linear_extrude(height = height, center = true)
  difference() {
    minkowski() {
      translate([0, 0, 0]) circle(r = minkR_PF, center = true, $fn = 32);
      square([2 * 20 - 2 * minkR_PF, 4 * 20 - 2 * minkR_PF], center = true);
    }
    translate([0.5 * 20, 1.5 * 20, 0]) circle(r = core / 2, $fn = 24);
    translate([-0.5 * 20, 1.5 * 20, 0]) circle(r = core / 2, $fn = 24);
    translate([0.5 * 20, 0.5 * 20, 0]) circle(r = core / 2, $fn = 24);
    translate([-0.5 * 20, 0.5 * 20, 0]) circle(r = core / 2, $fn = 24);
    translate([0.5 * 20, -1.5 * 20, 0]) circle(r = core / 2, $fn = 24);
    translate([-0.5 * 20, -1.5 * 20, 0]) circle(r = core / 2, $fn = 24);
    translate([0.5 * 20, -0.5 * 20, 0]) circle(r = core / 2, $fn = 24);
    translate([-0.5 * 20, -0.5 * 20, 0]) circle(r = core / 2, $fn = 24);
    translate([0, 1 * 20, 0]) doubleCutout();
    translate([0, -1 * 20, 0]) doubleCutout();
    translate([0.5 * 20, 0, 0]) insideCutout();
    translate([-0.5 * 20, 0, 0]) insideCutout();
    translate([-1 * 20 + 0.087 * 20, 0.5 * 20, 0]) tSlot();
    rotate([0, 0, 180]) translate([-1 * 20 + 0.087 * 20, 0.5 * 20, 0]) tSlot();
    translate([-1 * 20 + 0.087 * 20, -0.5 * 20, 0]) tSlot();
    rotate([0, 0, 180]) translate([-1 * 20 + 0.087 * 20, -0.5 * 20, 0]) tSlot();
    translate([-1 * 20 + 0.087 * 20, 1.5 * 20, 0]) tSlot();
    rotate([0, 0, 180]) translate([-1 * 20 + 0.087 * 20, 1.5 * 20, 0]) tSlot();
    translate([-1 * 20 + 0.087 * 20, -1.5 * 20, 0]) tSlot();
    rotate([0, 0, 180]) translate([-1 * 20 + 0.087 * 20, -1.5 * 20, 0]) tSlot();
    translate([-0.5 * 20, 2 * 20 - 0.087 * 20, 0]) rotate([0, 0, -90]) tSlot();
    rotate([0, 0, 180]) translate([-0.5 * 20, 2 * 20 - 0.087 * 20, 0]) rotate([0, 0, -90]) tSlot();
    translate([0.5 * 20, 2 * 20 - 0.087 * 20, 0]) rotate([0, 0, -90]) tSlot();
    rotate([0, 0, 180]) translate([0.5 * 20, 2 * 20 - 0.087 * 20, 0]) rotate([0, 0, -90]) tSlot();
  }
}
